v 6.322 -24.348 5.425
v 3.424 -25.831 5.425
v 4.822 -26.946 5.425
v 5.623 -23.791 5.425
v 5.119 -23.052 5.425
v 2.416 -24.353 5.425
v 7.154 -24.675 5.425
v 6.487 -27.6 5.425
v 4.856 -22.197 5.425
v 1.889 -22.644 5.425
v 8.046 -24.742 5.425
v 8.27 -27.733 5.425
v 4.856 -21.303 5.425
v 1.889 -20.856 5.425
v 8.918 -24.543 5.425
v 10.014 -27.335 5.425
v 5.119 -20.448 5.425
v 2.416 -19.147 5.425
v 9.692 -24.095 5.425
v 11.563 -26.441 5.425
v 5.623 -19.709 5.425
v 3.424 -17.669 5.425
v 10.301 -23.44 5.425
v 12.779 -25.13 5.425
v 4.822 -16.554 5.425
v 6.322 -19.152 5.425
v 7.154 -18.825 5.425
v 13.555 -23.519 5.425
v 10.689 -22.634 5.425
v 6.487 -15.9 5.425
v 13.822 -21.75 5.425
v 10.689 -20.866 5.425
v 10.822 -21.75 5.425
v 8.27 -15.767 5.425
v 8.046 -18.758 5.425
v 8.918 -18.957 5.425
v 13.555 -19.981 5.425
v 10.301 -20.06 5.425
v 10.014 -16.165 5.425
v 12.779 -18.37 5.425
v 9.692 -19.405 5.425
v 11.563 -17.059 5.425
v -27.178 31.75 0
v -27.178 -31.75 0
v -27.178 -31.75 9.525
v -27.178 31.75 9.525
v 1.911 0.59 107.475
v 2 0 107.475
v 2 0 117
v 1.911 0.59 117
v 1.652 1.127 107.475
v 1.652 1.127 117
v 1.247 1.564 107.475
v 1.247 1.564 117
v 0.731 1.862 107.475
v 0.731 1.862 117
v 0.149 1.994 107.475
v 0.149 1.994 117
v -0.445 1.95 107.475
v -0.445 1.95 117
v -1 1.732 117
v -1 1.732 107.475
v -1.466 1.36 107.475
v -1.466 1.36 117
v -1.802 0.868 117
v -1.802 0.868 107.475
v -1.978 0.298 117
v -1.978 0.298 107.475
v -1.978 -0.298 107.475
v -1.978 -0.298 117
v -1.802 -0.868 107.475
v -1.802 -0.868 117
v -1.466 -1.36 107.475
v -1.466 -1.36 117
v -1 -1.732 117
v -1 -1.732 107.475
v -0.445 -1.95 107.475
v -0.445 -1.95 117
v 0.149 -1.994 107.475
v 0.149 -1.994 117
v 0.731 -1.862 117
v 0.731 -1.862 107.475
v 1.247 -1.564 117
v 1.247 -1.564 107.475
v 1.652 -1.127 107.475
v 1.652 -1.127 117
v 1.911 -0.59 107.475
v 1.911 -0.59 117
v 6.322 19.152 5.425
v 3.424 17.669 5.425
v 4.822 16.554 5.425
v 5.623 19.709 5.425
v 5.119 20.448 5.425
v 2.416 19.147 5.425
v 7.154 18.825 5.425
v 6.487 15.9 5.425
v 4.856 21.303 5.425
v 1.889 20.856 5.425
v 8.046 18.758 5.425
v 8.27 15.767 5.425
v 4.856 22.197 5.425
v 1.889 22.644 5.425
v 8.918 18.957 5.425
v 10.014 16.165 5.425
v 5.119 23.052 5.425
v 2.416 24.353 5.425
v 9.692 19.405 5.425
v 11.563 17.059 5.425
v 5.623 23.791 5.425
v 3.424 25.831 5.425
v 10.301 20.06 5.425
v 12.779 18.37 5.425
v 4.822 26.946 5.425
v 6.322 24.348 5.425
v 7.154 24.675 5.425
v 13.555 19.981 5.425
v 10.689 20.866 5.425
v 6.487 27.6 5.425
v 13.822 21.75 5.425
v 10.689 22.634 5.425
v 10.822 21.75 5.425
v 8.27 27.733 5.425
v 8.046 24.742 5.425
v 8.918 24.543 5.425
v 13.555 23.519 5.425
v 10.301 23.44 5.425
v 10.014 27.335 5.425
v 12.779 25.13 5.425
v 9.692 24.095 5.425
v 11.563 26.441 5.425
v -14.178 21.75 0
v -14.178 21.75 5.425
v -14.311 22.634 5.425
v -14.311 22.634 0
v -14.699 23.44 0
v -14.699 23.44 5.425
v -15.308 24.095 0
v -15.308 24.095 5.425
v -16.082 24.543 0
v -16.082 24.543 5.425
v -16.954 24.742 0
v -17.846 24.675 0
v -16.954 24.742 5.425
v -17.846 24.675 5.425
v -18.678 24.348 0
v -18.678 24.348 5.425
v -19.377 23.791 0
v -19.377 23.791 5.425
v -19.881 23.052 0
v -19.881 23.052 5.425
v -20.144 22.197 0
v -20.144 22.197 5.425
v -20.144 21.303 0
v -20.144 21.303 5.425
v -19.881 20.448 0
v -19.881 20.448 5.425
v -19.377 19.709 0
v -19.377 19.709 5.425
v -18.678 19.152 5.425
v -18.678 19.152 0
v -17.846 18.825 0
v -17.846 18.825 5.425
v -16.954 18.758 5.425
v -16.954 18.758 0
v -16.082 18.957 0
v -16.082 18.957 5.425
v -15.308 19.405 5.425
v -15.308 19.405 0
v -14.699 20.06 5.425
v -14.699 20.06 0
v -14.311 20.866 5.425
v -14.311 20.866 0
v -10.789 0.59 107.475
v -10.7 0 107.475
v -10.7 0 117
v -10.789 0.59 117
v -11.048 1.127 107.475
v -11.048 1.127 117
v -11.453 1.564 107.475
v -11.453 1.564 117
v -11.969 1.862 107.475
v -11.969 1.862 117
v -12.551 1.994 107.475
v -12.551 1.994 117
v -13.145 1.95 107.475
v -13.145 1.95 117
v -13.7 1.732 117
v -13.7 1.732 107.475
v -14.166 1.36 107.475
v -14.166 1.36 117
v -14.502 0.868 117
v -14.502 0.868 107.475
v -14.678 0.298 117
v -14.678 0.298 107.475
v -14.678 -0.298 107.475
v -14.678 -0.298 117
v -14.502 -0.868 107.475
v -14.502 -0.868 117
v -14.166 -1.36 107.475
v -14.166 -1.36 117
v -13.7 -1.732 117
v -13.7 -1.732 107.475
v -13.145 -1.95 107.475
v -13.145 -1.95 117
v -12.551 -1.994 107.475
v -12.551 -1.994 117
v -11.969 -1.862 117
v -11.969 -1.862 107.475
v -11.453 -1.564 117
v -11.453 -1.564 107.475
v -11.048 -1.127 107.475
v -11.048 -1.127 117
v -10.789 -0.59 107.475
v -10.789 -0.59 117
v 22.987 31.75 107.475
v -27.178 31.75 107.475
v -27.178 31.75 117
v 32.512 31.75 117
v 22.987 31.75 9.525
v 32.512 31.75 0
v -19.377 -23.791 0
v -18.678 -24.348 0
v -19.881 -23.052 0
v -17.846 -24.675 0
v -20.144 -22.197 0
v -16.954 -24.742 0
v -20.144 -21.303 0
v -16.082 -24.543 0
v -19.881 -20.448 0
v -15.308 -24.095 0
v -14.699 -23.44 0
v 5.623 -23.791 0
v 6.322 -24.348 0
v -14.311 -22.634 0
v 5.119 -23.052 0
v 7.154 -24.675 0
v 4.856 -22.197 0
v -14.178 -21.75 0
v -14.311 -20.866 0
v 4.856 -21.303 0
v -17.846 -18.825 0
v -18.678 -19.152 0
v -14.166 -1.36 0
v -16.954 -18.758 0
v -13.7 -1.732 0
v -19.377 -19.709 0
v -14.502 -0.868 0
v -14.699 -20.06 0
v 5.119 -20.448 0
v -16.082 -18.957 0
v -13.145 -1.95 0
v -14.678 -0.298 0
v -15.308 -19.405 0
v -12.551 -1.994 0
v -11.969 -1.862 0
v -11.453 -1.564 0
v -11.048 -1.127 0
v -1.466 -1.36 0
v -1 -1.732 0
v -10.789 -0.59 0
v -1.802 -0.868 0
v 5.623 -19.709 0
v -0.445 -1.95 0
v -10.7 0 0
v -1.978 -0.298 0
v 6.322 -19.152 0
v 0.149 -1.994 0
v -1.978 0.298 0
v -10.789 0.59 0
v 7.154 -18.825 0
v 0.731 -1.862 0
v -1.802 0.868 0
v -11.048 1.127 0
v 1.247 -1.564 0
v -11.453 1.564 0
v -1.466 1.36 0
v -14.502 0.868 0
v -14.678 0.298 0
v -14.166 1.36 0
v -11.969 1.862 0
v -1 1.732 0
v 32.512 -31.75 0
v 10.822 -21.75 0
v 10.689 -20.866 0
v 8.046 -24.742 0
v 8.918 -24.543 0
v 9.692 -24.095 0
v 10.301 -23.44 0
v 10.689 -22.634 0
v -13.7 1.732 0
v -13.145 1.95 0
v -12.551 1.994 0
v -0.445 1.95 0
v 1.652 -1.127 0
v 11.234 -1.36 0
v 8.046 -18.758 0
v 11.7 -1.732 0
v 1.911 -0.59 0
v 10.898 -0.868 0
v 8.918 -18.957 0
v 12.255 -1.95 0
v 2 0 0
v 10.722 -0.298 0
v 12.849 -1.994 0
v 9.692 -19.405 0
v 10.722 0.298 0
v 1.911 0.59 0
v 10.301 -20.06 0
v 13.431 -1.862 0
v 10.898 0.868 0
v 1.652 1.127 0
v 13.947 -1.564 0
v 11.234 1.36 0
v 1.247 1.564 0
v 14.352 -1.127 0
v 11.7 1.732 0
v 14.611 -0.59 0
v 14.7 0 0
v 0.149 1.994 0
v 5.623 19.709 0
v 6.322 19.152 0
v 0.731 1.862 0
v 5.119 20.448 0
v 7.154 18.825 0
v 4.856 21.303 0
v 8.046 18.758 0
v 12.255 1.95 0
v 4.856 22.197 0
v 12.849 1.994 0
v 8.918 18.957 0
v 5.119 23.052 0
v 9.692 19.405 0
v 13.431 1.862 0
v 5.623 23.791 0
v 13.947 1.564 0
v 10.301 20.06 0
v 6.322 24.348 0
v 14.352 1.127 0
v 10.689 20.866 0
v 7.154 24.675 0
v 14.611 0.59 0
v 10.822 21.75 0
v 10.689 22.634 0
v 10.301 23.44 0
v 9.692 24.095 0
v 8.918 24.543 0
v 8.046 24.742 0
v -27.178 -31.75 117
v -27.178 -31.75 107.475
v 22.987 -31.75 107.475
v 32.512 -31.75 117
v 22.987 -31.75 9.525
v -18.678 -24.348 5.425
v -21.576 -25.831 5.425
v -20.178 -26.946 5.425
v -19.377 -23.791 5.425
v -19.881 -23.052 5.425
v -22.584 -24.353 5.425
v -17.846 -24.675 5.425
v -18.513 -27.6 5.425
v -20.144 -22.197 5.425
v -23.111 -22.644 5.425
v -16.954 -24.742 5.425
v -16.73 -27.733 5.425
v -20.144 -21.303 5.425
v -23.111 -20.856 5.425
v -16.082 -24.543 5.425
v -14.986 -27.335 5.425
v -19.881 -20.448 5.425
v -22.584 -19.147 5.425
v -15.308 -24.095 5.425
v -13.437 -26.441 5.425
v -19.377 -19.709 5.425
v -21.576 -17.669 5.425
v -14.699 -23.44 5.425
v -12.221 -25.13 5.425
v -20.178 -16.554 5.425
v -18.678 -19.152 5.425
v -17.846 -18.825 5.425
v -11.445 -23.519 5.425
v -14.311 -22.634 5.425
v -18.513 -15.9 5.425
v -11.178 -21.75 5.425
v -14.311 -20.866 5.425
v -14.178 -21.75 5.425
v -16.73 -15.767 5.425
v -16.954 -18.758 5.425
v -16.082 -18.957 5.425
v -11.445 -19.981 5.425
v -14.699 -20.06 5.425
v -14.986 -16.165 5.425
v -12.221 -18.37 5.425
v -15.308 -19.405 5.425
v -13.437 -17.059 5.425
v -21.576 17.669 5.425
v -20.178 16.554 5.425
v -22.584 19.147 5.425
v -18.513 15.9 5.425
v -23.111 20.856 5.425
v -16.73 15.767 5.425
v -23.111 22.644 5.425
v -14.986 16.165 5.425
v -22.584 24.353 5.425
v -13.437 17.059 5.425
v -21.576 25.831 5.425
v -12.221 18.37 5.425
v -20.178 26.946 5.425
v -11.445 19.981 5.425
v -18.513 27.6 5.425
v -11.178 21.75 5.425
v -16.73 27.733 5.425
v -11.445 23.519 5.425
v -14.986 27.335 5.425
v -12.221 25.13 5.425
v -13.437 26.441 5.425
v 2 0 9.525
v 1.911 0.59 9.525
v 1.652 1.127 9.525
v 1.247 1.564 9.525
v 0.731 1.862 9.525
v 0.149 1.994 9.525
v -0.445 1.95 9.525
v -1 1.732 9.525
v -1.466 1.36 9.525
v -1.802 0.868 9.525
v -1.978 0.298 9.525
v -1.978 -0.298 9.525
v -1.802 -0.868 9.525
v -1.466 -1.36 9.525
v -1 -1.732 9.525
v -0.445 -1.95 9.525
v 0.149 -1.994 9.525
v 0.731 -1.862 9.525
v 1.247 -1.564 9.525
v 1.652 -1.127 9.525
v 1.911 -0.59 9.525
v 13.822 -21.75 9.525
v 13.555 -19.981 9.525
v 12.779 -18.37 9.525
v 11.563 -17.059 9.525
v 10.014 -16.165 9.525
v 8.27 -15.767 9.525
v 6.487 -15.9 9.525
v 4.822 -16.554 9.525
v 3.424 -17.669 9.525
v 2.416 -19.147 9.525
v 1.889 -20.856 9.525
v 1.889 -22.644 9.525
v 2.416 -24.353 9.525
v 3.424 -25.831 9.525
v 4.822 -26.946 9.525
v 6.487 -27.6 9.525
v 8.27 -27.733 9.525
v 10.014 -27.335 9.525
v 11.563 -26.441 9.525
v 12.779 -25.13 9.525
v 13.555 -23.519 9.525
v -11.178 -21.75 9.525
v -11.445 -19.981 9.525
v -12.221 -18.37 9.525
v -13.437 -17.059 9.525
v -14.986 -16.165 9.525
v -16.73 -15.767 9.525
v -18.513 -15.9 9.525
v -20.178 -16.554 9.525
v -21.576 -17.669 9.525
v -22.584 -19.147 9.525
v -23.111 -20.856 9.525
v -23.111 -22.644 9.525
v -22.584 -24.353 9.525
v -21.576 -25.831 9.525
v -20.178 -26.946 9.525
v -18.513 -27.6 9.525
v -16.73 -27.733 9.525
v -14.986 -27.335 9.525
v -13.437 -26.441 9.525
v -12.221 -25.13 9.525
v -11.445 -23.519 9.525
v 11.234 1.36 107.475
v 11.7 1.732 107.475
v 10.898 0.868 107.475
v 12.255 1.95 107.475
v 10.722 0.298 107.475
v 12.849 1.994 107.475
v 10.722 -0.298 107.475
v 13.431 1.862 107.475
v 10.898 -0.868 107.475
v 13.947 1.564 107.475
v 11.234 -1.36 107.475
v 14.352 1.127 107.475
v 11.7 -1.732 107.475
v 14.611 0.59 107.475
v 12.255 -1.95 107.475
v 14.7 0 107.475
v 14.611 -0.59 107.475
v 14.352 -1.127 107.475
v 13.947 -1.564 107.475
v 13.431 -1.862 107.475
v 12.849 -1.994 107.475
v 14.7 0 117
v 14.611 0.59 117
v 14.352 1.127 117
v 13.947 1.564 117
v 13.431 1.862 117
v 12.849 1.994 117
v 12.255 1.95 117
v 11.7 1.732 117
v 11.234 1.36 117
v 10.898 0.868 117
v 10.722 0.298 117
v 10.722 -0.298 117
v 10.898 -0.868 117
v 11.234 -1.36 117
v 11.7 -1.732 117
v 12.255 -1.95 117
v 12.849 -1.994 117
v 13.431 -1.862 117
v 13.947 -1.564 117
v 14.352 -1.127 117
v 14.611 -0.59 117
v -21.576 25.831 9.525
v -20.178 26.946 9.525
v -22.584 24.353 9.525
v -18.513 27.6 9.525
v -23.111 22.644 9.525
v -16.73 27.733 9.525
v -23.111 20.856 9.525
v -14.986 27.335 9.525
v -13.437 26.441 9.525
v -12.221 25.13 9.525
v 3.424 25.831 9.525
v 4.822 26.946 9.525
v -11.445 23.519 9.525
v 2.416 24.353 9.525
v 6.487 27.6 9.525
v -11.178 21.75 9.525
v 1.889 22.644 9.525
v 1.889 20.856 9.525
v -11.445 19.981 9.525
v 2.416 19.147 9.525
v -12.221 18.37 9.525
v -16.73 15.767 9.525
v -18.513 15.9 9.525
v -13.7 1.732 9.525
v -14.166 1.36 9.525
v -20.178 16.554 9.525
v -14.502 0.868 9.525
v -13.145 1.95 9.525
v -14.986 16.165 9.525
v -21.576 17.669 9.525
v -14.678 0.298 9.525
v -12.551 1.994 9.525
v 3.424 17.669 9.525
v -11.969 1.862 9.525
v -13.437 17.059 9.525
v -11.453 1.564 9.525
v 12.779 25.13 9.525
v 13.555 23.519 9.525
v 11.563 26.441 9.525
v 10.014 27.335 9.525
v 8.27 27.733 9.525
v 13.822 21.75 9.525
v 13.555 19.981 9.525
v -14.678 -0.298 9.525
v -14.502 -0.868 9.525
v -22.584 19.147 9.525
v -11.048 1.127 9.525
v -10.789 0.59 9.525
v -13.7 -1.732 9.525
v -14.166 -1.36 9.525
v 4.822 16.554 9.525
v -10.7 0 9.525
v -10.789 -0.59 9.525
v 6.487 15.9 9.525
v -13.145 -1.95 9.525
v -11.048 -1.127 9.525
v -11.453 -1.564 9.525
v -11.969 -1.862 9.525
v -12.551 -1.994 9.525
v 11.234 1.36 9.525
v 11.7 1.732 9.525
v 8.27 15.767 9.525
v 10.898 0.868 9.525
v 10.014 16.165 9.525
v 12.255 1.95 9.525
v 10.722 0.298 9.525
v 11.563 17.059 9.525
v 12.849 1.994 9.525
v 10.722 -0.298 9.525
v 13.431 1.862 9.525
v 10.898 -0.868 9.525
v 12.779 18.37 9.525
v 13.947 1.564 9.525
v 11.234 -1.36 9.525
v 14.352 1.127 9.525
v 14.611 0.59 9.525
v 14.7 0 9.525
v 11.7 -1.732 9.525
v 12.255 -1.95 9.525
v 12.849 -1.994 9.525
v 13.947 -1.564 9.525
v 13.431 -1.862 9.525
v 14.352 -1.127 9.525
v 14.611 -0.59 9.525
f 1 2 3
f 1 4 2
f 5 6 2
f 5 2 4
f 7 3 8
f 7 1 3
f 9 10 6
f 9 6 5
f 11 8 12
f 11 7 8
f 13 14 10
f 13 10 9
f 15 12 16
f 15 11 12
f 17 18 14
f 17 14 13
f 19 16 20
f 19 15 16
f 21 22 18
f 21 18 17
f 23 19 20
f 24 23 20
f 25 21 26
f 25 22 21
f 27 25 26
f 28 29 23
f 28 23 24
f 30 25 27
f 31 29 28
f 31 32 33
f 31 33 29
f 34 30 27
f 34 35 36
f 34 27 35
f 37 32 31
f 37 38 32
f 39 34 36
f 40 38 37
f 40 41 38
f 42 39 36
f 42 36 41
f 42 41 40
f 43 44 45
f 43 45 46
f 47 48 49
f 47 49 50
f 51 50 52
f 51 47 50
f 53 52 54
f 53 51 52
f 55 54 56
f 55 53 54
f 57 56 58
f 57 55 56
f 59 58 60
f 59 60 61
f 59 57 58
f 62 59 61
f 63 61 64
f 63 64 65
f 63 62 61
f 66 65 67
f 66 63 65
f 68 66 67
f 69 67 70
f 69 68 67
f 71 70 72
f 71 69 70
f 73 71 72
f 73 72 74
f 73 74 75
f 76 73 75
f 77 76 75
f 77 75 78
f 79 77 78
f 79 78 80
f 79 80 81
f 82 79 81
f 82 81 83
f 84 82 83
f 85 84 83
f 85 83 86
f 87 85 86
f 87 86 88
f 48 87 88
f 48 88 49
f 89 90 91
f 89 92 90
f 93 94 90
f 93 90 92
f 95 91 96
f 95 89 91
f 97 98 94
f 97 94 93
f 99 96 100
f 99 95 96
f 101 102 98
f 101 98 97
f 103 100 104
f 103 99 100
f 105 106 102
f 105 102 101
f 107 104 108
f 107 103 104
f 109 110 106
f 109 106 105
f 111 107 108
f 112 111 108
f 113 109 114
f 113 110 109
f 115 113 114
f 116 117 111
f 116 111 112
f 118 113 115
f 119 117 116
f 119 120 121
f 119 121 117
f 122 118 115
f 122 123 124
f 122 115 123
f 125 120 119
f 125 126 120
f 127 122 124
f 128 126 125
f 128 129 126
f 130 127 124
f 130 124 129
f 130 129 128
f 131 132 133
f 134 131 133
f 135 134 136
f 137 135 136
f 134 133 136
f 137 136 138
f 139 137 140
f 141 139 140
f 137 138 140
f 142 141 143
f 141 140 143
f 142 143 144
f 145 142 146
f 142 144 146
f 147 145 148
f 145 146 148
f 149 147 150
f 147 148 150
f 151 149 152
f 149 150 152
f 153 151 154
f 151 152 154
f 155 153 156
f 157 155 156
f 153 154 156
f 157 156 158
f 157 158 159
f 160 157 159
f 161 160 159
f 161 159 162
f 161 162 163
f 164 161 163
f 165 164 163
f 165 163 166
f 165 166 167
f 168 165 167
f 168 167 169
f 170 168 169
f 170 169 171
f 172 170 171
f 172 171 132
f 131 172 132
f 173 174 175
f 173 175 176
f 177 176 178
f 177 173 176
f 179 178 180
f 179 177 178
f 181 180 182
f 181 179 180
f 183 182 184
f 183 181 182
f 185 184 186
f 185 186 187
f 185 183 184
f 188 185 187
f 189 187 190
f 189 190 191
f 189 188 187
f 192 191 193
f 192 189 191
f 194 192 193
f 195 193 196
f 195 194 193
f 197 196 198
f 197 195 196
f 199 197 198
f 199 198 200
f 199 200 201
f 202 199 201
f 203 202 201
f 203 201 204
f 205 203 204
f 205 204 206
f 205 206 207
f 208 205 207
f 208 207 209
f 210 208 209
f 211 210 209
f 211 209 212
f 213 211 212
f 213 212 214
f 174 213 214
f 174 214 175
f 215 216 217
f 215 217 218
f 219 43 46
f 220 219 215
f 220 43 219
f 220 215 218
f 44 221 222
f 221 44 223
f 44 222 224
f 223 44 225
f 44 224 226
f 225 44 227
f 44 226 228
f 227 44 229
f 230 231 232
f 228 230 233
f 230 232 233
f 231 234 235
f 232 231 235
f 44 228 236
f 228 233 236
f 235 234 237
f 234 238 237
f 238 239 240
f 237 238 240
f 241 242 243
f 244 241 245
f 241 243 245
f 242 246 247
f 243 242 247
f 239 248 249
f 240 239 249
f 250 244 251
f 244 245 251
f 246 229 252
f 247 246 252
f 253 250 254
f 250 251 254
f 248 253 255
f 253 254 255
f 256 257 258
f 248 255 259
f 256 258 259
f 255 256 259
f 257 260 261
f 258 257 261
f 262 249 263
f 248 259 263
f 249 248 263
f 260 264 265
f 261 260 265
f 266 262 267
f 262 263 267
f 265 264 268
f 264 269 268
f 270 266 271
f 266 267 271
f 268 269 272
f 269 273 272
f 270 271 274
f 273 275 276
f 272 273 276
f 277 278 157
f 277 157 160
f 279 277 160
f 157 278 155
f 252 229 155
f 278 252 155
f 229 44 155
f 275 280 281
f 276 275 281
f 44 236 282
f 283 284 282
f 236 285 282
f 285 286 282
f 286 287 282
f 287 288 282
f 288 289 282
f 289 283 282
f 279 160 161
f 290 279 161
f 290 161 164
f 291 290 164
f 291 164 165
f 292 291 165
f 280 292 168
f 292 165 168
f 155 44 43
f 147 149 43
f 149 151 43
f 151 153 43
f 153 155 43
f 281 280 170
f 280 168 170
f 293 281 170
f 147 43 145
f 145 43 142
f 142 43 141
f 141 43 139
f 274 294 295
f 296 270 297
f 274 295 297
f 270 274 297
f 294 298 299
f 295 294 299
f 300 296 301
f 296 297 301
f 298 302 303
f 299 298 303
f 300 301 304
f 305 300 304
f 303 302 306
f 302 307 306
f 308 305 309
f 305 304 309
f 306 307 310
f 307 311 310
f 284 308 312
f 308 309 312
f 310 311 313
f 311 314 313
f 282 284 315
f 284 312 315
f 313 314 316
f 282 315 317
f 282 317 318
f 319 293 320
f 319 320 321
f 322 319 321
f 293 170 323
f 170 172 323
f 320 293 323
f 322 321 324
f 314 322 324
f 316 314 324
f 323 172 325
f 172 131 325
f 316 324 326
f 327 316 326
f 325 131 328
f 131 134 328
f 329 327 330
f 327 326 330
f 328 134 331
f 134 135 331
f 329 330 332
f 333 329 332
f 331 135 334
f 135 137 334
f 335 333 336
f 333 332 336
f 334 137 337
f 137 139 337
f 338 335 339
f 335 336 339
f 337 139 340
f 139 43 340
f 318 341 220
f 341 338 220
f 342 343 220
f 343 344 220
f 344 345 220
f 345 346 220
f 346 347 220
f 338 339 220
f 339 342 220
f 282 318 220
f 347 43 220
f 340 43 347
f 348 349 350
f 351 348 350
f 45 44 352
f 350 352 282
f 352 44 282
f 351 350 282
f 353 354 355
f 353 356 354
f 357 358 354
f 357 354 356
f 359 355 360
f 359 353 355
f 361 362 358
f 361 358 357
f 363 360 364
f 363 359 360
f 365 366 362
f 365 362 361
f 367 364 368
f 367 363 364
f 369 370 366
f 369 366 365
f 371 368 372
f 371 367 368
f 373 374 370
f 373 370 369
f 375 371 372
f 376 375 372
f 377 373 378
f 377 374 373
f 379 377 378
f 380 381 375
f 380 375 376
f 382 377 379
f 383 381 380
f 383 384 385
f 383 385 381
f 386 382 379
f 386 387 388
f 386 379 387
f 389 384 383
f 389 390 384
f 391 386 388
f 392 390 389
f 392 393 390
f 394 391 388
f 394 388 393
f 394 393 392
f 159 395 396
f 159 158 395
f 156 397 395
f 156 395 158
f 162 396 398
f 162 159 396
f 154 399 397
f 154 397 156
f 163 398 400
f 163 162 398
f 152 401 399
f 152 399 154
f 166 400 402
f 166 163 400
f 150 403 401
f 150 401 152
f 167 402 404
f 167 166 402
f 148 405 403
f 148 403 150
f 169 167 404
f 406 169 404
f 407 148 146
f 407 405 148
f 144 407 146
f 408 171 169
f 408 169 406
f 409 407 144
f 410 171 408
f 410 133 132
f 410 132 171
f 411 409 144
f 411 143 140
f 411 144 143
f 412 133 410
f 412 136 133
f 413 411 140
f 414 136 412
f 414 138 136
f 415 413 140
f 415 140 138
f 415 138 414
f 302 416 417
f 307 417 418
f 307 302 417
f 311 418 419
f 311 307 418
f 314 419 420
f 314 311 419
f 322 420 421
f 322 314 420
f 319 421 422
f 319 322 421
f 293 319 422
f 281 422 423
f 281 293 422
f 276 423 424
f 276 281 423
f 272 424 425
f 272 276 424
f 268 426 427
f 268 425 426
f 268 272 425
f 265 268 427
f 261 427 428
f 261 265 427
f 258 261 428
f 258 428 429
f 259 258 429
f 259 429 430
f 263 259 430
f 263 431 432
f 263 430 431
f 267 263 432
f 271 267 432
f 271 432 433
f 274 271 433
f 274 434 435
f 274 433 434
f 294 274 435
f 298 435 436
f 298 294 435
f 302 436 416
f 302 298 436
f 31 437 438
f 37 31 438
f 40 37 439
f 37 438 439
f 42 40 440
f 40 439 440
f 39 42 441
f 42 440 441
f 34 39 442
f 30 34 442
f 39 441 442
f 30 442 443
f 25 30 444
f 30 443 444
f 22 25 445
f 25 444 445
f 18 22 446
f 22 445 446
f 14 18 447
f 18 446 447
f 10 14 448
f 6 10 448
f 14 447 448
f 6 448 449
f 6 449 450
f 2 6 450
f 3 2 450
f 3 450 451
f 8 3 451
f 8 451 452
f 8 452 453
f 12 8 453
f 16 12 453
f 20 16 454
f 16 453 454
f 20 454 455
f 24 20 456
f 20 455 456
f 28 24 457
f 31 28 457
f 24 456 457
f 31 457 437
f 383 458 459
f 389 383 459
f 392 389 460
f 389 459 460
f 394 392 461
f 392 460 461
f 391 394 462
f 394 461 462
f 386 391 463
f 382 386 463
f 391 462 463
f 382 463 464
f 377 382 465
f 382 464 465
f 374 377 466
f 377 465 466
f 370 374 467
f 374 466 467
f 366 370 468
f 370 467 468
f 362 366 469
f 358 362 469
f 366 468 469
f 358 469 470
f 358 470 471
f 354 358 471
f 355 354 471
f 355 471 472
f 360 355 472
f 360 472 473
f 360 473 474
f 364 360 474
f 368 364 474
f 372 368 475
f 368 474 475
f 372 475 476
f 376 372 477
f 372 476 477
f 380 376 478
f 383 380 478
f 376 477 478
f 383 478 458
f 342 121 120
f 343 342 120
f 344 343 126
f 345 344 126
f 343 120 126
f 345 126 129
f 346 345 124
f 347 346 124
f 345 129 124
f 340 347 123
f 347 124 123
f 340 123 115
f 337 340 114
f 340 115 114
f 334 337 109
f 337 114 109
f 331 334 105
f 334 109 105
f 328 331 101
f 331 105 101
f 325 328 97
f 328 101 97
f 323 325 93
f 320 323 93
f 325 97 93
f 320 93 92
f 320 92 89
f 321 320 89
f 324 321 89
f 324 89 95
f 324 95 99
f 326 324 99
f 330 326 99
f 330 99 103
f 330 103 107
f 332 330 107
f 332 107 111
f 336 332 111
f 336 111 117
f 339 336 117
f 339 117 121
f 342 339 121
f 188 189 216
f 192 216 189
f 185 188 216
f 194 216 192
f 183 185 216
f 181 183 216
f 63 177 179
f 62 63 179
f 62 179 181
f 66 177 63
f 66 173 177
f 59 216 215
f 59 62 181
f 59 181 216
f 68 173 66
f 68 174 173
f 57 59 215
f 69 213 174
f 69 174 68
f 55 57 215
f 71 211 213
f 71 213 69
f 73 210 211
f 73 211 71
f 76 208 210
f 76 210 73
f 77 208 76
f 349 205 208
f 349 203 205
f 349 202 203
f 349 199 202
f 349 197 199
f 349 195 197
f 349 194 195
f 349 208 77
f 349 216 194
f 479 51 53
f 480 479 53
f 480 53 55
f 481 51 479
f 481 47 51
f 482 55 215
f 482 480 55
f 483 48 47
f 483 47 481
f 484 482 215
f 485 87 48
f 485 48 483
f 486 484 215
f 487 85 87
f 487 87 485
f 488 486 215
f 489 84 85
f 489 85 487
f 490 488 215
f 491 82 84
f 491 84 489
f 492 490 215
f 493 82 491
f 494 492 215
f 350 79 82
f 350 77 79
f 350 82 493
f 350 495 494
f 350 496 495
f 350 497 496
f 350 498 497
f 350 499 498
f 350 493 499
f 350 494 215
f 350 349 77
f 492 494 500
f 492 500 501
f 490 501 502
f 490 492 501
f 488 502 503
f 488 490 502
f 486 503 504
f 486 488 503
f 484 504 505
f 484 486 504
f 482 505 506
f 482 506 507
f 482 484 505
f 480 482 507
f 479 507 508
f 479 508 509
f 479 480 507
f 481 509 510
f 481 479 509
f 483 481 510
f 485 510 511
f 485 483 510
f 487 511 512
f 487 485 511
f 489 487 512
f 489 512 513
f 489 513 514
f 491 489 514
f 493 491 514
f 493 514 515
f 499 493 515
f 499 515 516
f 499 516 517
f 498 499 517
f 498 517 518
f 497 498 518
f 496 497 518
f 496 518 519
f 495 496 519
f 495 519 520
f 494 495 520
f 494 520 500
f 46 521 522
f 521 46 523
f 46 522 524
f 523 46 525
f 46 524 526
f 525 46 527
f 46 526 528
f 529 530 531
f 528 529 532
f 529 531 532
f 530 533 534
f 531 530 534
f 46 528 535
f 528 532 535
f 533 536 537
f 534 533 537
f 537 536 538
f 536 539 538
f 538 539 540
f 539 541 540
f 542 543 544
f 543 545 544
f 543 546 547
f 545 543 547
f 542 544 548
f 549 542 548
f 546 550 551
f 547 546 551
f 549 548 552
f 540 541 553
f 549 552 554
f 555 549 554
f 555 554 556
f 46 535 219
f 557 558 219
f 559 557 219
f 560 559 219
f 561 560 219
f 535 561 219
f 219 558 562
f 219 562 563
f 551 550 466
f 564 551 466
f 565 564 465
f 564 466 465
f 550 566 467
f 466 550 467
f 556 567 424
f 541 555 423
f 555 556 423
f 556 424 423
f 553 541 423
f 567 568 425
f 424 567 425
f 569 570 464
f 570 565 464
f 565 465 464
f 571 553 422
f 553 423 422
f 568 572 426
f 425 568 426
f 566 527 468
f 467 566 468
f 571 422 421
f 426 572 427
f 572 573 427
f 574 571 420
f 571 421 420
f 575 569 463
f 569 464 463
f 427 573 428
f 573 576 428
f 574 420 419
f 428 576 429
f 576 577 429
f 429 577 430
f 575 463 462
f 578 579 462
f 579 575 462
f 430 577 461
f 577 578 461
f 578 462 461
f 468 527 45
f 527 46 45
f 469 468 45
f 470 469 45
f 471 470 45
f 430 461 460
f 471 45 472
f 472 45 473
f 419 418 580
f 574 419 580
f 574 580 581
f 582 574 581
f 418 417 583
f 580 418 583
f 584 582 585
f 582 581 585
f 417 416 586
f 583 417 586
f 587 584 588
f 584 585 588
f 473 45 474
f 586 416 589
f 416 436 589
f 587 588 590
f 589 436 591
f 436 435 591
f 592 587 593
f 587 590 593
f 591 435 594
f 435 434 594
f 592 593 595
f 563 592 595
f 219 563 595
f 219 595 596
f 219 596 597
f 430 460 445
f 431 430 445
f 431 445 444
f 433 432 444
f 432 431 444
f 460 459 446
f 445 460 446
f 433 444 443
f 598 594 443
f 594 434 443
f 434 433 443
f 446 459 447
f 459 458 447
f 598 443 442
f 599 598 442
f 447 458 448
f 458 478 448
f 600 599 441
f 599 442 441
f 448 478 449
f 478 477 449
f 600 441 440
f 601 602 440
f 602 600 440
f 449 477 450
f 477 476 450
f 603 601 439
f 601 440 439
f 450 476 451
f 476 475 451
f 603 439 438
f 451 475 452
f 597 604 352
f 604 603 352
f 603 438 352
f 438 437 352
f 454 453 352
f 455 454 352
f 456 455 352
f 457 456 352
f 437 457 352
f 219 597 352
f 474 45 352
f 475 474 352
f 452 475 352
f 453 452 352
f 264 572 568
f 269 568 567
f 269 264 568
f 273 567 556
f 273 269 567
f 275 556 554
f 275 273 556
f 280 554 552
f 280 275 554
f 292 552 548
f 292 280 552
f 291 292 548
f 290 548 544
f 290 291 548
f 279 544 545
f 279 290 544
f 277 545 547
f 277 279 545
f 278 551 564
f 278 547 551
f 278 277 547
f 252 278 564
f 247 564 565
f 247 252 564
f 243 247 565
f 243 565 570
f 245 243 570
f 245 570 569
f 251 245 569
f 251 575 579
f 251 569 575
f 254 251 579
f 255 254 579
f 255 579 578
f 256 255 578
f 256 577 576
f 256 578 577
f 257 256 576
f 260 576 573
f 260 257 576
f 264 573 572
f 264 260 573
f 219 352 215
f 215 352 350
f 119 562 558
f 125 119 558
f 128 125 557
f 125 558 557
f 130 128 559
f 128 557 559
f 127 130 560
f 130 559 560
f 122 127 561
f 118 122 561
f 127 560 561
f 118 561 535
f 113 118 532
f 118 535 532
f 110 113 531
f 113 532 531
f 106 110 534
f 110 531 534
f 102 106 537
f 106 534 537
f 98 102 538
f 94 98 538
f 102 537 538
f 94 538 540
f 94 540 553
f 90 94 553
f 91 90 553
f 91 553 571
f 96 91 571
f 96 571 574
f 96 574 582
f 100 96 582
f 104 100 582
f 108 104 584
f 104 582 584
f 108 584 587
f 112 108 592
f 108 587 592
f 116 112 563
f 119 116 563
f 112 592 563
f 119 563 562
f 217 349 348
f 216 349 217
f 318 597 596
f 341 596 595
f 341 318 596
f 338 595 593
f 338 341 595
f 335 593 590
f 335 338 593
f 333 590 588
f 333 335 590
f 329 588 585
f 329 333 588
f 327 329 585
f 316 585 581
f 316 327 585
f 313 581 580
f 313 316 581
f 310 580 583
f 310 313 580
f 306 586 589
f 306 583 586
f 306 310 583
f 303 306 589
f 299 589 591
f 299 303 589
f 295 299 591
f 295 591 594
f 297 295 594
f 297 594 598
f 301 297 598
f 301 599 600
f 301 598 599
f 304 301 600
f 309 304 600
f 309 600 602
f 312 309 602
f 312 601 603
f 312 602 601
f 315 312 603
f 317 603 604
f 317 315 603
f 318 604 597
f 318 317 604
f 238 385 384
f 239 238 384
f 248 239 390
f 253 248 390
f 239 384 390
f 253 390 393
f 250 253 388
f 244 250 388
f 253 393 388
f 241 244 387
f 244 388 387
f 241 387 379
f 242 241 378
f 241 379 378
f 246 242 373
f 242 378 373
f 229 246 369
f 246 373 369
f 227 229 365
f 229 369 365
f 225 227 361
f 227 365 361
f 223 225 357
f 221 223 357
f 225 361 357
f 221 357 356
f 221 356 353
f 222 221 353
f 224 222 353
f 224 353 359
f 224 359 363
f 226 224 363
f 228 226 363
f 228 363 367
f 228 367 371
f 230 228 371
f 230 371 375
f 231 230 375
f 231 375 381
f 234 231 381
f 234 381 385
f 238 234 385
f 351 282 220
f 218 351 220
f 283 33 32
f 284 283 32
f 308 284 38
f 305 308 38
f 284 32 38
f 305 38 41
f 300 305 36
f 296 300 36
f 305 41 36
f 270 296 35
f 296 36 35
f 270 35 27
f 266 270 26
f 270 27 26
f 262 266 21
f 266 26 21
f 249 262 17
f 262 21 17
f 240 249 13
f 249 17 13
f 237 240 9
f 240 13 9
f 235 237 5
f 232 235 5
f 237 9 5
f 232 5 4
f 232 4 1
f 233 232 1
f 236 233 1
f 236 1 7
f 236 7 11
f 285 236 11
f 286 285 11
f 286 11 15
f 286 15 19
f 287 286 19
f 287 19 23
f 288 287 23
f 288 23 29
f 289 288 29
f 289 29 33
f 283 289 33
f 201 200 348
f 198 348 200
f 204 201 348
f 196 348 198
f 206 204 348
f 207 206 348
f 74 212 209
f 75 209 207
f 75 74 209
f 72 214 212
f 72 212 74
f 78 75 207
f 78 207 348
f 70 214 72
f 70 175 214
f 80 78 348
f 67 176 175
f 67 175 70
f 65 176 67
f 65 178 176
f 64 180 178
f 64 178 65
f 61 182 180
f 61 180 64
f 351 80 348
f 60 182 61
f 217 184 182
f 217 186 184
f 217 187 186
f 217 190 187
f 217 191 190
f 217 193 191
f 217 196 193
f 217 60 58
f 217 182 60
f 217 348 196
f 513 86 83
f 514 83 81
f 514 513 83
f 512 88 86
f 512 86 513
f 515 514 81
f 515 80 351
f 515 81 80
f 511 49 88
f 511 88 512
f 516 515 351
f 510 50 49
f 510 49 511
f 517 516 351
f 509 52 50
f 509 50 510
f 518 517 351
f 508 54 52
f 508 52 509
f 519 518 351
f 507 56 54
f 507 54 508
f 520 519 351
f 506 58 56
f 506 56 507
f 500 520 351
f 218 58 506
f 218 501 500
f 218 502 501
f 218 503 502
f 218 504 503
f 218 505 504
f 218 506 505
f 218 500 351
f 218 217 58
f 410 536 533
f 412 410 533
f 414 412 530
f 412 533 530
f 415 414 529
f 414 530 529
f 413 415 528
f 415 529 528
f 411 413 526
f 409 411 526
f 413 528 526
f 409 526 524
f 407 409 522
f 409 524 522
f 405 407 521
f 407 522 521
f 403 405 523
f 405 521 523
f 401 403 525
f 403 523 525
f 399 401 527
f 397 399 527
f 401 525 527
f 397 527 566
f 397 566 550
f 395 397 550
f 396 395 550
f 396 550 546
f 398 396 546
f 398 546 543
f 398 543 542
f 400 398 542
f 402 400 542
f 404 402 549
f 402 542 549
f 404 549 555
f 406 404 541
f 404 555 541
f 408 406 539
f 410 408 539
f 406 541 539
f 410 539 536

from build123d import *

# Parameters (mm, degrees)
SKETCH1_W           = 59.69
SKETCH1_H           = 63.5
SKETCH1_R           = 2
BOSS_EXTRUDE1_DEPTH = 117
SKETCH2_W           = 50.165
SKETCH2_H           = 97.95
CUT_EXTRUDE1_DEPTH  = 138.033864953
SKETCH3_R           = 6
SKETCH3_R_2         = 3
CUT_EXTRUDE2_DEPTH  = 4.1
SKETCH5_R           = 3
CUT_EXTRUDE3_DEPTH  = 117.687481201


with BuildPart() as part:
    # Sketch1 → Boss-Extrude1 (new body)
    with BuildSketch(Plane.XY):
        with Locations((2.667, 0)):
            Rectangle(SKETCH1_W, SKETCH1_H)
        with Locations((-12.7, 0)):
            Circle(SKETCH1_R, mode=Mode.SUBTRACT)
        Circle(SKETCH1_R, mode=Mode.SUBTRACT)
        with Locations((12.7, 0)):
            Circle(SKETCH1_R, mode=Mode.SUBTRACT)
    extrude(amount=BOSS_EXTRUDE1_DEPTH)

    # Sketch2 → Cut-Extrude1 (cut, through all)
    with BuildSketch(Plane.XZ.offset(31.75)):
        with Locations((-2.0955, 58.5)):
            Rectangle(SKETCH2_W, SKETCH2_H)
    extrude(amount=-CUT_EXTRUDE1_DEPTH, mode=Mode.SUBTRACT)

    # Sketch3 → Cut-Extrude2 (cut)
    # profile 1 of 4: a face of its own
    with BuildSketch(Plane.XY.offset(9.525)):
        with Locations((-17.178, -21.75)):
            Circle(SKETCH3_R)
        with Locations((-17.178, -21.75)):
            Circle(SKETCH3_R_2, mode=Mode.SUBTRACT)
    # profile 2 of 4: a face of its own
    with BuildSketch(Plane.XY.offset(9.525)):
        with Locations((7.822, -21.75)):
            Circle(SKETCH3_R)
        with Locations((7.822, -21.75)):
            Circle(SKETCH3_R_2, mode=Mode.SUBTRACT)
    # profile 3 of 4: a face of its own
    with BuildSketch(Plane.XY.offset(9.525)):
        with Locations((-17.178, 21.75)):
            Circle(SKETCH3_R)
        with Locations((-17.178, 21.75)):
            Circle(SKETCH3_R_2, mode=Mode.SUBTRACT)
    # profile 4 of 4: a face of its own
    with BuildSketch(Plane.XY.offset(9.525)):
        with Locations((7.822, 21.75)):
            Circle(SKETCH3_R)
        with Locations((7.822, 21.75)):
            Circle(SKETCH3_R_2, mode=Mode.SUBTRACT)
    extrude(amount=-CUT_EXTRUDE2_DEPTH, mode=Mode.SUBTRACT)

    # Sketch5 → Cut-Extrude3 (cut, through all)
    with BuildSketch(Plane.XY.offset(9.525)):
        with Locations((-17.178, 21.75)):
            Circle(SKETCH5_R)
        with Locations((7.822, 21.75)):
            Circle(SKETCH5_R)
        with Locations((7.822, -21.75)):
            Circle(SKETCH5_R)
        with Locations((-17.178, -21.75)):
            Circle(SKETCH5_R)
    extrude(amount=-CUT_EXTRUDE3_DEPTH, mode=Mode.SUBTRACT)


solid = part.part
